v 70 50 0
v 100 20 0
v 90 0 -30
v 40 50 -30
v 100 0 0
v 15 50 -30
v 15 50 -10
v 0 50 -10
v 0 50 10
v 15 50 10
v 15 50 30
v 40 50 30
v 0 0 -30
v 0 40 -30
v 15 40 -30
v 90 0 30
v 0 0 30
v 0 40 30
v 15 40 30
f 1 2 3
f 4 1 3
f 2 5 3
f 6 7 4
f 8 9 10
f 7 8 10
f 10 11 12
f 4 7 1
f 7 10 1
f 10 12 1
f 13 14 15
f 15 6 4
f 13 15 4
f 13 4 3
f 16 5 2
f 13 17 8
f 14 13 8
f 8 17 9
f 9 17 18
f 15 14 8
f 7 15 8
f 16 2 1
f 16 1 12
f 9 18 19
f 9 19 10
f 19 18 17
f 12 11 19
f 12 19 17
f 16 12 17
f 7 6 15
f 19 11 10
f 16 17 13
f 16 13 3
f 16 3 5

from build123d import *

# Parameters (mm, degrees)
CROQUIS2_W              = 100
CROQUIS2_H              = 50
SALIENTE_EXTRUIR1_DEPTH = 30
CORTAR_EXTRUIR1_DEPTH   = 15
CORTAR_EXTRUIR2_DEPTH   = 20
CORTAR_EXTRUIR3_DEPTH   = 165.121269


with BuildPart() as part:
    # Croquis2 → Saliente-Extruir1 (new, symmetric)
    with BuildSketch(Plane.XY):
        with Locations((50, 25)):
            Rectangle(CROQUIS2_W, CROQUIS2_H)
    extrude(amount=SALIENTE_EXTRUIR1_DEPTH, both=True)

    # Croquis3 → Cortar-Extruir1 (cut)
    with BuildSketch(Plane.ZY):
        Polygon((30, 50), (30, 40), (10, 50), align=None)
    cortar_extruir1 = extrude(amount=-CORTAR_EXTRUIR1_DEPTH, mode=Mode.SUBTRACT)

    # Croquis4 → Cortar-Extruir2 (cut)
    with BuildSketch(Plane.XZ):
        Polygon((100, 0), (90, 30), (100, 30), align=None)
    cortar_extruir2 = extrude(amount=-CORTAR_EXTRUIR2_DEPTH, mode=Mode.SUBTRACT)

    # Croquis6 → Cortar-Extruir3 (cut, through all, along a direction that is not the sketch's normal)
    with BuildSketch(Plane(origin=(0, 50, 0), x_dir=(1, 0, 0), z_dir=(0, 1, 0))):
        Polygon((100, 0), (70, 0), (40, -30), (100, -30), align=None)
    cortar_extruir3 = extrude(amount=-CORTAR_EXTRUIR3_DEPTH, dir=(-0.7071067811865475, 0.7071067811865476, 0), mode=Mode.SUBTRACT)

    # Simetría1: Cortar-Extruir1, Cortar-Extruir2, Cortar-Extruir3 across plane
    add(cortar_extruir1.mirror(Plane.XY), mode=Mode.SUBTRACT)
    add(cortar_extruir2.mirror(Plane.XY), mode=Mode.SUBTRACT)
    add(cortar_extruir3.mirror(Plane.XY), mode=Mode.SUBTRACT)


solid = part.part
